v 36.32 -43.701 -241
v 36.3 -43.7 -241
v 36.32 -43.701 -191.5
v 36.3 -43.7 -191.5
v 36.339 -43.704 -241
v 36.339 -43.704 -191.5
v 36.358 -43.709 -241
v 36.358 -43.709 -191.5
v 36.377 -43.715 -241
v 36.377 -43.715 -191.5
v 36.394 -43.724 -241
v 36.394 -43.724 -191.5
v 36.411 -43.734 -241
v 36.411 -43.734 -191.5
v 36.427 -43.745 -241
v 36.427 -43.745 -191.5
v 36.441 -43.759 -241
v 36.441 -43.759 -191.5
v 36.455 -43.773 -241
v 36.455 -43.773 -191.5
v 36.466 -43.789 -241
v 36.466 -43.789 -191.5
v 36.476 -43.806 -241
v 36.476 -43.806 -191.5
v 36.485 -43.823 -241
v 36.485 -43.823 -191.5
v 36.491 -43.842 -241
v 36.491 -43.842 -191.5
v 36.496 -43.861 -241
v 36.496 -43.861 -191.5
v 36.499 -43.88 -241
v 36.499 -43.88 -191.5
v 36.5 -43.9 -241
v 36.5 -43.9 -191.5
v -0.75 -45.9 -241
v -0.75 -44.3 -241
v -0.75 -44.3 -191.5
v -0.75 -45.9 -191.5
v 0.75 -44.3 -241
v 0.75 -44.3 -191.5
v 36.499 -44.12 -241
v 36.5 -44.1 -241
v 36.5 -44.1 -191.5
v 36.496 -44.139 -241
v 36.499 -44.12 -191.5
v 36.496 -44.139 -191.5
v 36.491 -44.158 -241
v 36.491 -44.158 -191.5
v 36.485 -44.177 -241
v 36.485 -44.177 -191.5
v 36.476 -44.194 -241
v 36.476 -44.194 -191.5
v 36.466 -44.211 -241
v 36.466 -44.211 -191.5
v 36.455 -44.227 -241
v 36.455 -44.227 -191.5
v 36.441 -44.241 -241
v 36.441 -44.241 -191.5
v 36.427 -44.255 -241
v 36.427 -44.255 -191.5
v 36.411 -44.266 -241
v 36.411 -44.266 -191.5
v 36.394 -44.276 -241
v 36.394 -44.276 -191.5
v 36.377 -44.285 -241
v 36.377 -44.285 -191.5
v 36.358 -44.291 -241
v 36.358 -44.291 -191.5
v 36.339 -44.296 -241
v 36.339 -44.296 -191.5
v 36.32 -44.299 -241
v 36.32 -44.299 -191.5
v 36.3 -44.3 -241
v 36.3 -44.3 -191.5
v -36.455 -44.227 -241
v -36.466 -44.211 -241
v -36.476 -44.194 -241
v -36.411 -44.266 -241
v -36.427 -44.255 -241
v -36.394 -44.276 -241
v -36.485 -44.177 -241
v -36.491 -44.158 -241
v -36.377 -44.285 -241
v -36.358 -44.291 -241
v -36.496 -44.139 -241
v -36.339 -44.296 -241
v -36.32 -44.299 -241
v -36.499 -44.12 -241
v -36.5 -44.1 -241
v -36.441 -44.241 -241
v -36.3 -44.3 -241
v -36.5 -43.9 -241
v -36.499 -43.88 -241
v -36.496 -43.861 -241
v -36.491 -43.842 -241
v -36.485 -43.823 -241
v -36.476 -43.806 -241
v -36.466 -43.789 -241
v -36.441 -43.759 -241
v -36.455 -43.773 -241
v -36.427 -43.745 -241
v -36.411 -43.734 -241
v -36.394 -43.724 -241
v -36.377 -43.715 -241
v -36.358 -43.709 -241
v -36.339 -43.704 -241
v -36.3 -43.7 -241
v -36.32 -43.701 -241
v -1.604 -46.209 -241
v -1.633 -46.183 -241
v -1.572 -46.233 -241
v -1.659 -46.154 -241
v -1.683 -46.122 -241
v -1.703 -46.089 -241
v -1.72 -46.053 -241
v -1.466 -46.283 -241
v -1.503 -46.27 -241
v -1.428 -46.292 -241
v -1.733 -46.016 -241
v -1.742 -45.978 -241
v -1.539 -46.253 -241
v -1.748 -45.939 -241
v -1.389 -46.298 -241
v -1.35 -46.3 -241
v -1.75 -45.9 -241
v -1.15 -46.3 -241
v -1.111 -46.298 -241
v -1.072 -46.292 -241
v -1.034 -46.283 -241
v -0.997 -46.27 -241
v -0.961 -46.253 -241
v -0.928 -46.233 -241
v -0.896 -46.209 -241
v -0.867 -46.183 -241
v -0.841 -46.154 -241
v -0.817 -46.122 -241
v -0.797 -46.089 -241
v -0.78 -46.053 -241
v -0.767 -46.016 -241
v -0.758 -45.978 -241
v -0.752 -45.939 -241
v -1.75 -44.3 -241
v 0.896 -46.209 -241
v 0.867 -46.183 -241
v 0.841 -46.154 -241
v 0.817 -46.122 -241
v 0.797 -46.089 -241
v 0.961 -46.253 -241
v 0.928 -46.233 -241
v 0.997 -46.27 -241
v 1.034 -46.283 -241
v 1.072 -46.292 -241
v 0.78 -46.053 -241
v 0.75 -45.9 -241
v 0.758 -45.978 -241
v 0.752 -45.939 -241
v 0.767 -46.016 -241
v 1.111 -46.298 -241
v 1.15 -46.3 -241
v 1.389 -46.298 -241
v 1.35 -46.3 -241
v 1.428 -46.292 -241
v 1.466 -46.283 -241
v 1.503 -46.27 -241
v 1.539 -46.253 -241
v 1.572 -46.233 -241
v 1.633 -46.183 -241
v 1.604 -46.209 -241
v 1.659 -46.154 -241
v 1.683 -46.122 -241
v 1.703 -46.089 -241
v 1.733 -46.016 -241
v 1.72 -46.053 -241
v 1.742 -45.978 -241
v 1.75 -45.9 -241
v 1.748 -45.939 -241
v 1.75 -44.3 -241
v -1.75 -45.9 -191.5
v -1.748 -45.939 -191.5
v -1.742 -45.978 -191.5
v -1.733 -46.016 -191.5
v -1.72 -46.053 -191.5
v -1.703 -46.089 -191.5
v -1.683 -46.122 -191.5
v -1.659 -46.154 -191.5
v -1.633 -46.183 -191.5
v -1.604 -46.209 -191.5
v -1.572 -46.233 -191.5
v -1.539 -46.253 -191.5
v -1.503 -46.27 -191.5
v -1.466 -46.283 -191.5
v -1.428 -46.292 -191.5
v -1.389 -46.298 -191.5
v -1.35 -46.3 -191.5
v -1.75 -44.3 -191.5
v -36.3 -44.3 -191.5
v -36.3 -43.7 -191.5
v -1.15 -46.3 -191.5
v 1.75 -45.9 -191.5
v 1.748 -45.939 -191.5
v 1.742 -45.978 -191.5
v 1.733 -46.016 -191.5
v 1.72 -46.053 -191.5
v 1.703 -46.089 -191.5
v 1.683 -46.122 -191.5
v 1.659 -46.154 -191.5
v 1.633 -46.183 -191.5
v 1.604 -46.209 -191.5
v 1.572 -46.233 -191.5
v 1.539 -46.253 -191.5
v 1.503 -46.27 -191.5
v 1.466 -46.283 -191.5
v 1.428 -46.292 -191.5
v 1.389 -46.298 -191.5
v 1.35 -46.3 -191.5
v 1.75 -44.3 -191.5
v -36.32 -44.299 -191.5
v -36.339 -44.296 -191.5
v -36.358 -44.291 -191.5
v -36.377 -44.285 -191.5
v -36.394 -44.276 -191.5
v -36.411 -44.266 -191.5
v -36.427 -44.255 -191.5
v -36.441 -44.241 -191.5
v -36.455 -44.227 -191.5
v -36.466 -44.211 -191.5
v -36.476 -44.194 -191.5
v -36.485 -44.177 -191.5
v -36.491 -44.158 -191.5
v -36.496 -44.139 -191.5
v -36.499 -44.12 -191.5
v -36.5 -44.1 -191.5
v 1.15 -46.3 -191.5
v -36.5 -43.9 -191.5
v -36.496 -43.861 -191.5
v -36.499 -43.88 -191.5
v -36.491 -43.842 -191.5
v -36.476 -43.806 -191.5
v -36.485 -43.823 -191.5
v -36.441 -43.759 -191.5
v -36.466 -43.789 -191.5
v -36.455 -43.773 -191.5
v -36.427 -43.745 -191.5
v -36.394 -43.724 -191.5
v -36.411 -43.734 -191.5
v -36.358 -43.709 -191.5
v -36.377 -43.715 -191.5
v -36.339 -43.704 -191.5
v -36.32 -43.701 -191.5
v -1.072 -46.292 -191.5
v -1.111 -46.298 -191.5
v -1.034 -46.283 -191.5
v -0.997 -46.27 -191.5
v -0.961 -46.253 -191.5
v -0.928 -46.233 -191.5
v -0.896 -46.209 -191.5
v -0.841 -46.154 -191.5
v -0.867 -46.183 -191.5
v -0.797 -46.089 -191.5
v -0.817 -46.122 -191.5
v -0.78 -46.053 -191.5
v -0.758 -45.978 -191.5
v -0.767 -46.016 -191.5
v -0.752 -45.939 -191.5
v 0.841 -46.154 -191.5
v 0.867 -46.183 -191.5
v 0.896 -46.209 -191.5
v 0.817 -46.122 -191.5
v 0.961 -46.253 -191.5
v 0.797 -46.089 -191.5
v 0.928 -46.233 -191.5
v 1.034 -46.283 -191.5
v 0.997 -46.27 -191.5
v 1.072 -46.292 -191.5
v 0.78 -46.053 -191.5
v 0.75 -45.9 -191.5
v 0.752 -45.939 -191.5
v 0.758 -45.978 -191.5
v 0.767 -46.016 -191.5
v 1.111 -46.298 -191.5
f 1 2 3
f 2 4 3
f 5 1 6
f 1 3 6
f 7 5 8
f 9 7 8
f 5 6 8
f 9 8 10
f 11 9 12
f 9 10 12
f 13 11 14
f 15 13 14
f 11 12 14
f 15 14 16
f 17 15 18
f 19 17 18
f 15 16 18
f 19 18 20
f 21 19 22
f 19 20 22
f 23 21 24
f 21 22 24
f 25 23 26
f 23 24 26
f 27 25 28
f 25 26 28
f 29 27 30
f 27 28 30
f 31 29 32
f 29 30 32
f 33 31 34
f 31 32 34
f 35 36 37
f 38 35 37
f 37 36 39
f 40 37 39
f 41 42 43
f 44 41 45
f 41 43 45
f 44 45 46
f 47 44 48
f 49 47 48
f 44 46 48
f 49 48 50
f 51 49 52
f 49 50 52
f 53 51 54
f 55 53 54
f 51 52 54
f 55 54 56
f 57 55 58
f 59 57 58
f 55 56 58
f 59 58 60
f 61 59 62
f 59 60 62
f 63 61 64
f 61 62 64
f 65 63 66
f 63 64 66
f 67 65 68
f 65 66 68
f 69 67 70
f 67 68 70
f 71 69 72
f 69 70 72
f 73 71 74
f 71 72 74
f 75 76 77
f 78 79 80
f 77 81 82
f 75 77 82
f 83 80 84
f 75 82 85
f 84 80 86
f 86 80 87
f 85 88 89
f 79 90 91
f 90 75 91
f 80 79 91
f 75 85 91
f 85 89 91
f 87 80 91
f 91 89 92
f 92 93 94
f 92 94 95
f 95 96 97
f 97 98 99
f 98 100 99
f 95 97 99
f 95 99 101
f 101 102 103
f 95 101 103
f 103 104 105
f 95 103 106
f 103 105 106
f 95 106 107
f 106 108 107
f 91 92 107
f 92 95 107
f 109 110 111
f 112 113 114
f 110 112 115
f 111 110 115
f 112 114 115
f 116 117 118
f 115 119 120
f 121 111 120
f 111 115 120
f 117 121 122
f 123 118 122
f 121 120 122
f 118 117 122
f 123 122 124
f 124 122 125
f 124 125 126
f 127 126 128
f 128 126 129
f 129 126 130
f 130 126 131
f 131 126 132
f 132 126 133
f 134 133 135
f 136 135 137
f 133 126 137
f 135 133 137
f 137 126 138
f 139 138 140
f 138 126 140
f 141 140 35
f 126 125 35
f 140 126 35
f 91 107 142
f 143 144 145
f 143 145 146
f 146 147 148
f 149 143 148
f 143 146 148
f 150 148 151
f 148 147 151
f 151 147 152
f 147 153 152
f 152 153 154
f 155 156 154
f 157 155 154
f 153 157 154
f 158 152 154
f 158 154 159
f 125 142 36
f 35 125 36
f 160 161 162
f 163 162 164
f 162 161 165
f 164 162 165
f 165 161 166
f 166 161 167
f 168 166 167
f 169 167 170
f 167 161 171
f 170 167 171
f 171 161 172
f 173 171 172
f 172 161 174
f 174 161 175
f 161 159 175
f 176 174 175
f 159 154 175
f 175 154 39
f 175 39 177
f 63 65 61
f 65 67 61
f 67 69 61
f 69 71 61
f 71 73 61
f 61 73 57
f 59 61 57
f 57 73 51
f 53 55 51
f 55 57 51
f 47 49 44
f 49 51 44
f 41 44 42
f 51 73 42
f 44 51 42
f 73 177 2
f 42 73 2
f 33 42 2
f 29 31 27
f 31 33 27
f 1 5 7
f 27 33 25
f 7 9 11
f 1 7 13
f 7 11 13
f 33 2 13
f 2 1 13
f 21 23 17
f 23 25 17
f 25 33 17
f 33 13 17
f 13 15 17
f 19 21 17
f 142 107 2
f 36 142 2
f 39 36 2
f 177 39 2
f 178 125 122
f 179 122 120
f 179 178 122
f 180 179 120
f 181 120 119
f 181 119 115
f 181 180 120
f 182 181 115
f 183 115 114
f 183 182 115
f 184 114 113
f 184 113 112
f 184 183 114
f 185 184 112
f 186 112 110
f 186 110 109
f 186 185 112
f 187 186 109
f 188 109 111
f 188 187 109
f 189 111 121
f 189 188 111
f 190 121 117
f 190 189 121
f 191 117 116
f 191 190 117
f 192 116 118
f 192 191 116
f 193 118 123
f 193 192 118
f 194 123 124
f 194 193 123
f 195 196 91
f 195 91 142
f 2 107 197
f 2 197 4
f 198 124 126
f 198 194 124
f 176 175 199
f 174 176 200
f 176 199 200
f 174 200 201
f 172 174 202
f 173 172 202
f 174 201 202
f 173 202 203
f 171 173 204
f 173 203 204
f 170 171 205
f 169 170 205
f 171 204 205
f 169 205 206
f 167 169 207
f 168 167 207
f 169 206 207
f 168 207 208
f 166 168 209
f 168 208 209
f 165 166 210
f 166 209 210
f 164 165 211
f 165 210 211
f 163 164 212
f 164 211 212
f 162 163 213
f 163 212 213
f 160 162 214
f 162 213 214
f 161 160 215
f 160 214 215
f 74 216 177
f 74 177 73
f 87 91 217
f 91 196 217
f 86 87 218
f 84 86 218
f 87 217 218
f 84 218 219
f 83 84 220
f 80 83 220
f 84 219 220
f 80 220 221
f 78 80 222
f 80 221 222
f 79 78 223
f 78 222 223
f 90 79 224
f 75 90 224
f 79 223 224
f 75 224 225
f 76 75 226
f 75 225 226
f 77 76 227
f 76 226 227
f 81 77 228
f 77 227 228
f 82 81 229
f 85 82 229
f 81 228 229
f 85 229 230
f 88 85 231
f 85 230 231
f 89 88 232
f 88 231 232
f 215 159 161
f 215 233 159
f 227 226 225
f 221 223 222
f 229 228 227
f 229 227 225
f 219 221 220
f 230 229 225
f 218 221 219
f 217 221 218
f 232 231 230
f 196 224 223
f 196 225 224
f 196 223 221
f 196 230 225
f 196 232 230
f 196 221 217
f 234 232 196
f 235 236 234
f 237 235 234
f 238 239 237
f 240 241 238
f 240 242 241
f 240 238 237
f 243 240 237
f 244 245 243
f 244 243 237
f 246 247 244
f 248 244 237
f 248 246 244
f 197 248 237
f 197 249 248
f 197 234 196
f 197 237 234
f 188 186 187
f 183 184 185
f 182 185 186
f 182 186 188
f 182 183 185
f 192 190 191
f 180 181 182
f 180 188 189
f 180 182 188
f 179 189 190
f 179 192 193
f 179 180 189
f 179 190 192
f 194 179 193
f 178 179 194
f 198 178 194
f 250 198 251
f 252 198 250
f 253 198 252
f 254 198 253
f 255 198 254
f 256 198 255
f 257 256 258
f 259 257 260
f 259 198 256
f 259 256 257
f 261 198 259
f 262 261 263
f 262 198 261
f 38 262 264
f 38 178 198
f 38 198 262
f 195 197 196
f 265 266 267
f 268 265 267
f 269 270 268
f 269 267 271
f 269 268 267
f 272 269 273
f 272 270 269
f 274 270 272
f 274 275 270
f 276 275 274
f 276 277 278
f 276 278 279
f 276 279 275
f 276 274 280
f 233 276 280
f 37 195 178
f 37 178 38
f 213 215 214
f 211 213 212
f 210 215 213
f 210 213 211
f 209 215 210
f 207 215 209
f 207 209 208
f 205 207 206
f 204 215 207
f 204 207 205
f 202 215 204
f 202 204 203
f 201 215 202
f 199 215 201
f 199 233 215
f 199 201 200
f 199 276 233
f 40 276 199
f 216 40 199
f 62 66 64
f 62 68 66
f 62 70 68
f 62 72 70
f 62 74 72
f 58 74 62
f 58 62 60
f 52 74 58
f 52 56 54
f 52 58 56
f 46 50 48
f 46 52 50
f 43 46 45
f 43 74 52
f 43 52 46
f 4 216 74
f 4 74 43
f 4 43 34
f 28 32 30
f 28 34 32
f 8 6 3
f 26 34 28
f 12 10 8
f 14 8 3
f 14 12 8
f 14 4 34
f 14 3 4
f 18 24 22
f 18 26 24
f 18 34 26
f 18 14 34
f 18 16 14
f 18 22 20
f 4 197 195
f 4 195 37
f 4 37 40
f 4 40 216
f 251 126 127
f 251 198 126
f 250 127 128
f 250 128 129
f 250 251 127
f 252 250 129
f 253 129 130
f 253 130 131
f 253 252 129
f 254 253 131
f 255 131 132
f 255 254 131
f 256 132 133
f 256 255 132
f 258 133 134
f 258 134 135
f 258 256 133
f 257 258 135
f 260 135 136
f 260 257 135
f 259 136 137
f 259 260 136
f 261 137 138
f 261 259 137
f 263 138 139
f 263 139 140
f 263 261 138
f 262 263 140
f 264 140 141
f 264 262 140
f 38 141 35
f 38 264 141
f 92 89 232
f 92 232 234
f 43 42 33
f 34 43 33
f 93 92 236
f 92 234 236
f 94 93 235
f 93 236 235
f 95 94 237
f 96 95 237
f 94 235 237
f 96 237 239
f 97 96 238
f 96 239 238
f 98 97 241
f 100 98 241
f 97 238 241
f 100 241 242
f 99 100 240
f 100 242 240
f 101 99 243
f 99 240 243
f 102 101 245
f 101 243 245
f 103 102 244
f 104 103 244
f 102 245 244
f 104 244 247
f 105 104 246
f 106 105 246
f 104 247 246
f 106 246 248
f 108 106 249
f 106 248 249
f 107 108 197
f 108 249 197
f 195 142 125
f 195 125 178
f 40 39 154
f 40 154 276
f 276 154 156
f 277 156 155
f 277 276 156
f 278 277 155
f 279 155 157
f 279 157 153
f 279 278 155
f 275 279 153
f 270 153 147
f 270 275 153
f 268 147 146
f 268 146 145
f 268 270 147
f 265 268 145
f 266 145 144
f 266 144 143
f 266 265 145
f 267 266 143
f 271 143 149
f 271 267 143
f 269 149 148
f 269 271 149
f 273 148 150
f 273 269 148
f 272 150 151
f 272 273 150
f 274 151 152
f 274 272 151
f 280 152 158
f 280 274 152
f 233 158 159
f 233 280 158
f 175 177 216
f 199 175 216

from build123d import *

# Parameters (mm, degrees)
SKETCH003_W  = 73
SKETCH003_H  = 0.6
PAD003_DEPTH = 49.5
SKETCH004_W  = 1
SKETCH004_H  = 49.5
PAD004_DEPTH = 2
FILLET005_R  = 0.4
FILLET006_R  = 0.2


with BuildPart() as part:
    # Sketch003 → Pad003 (new body)
    with BuildSketch(Plane.XY):
        Rectangle(SKETCH003_W, SKETCH003_H)
    extrude(amount=PAD003_DEPTH)

    # Sketch004 (on Face3 of Pad003) → Pad004 (join)
    with BuildSketch(Plane.XZ.offset(0.3)):
        with Locations((-1.25, 24.75)):
            Rectangle(SKETCH004_W, SKETCH004_H)
        with Locations((1.25, 24.75)):
            Rectangle(SKETCH004_W, SKETCH004_H)
    extrude(amount=PAD004_DEPTH)

    # Fillet005
    fillet005_edges = [part.edges().sort_by_distance(p)[0] for p in [
        (-1.75, -2.3, 24.75),
        (-0.75, -2.3, 24.75),
        (0.75, -2.3, 24.75),
        (1.75, -2.3, 24.75),
    ]]
    fillet(fillet005_edges, radius=FILLET005_R)

    # Fillet006
    fillet006_edges = [part.edges().sort_by_distance(p)[0] for p in [
        (-36.5, -0.3, 24.75),
        (-36.5, 0.3, 24.75),
        (36.5, -0.3, 24.75),
        (36.5, 0.3, 24.75),
    ]]
    fillet(fillet006_edges, radius=FILLET006_R)


with BuildPart() as part_1:
    # Body002 placement: moved
    add(part.part.moved(Location((0, -44, -241))))


solid = part_1.part
